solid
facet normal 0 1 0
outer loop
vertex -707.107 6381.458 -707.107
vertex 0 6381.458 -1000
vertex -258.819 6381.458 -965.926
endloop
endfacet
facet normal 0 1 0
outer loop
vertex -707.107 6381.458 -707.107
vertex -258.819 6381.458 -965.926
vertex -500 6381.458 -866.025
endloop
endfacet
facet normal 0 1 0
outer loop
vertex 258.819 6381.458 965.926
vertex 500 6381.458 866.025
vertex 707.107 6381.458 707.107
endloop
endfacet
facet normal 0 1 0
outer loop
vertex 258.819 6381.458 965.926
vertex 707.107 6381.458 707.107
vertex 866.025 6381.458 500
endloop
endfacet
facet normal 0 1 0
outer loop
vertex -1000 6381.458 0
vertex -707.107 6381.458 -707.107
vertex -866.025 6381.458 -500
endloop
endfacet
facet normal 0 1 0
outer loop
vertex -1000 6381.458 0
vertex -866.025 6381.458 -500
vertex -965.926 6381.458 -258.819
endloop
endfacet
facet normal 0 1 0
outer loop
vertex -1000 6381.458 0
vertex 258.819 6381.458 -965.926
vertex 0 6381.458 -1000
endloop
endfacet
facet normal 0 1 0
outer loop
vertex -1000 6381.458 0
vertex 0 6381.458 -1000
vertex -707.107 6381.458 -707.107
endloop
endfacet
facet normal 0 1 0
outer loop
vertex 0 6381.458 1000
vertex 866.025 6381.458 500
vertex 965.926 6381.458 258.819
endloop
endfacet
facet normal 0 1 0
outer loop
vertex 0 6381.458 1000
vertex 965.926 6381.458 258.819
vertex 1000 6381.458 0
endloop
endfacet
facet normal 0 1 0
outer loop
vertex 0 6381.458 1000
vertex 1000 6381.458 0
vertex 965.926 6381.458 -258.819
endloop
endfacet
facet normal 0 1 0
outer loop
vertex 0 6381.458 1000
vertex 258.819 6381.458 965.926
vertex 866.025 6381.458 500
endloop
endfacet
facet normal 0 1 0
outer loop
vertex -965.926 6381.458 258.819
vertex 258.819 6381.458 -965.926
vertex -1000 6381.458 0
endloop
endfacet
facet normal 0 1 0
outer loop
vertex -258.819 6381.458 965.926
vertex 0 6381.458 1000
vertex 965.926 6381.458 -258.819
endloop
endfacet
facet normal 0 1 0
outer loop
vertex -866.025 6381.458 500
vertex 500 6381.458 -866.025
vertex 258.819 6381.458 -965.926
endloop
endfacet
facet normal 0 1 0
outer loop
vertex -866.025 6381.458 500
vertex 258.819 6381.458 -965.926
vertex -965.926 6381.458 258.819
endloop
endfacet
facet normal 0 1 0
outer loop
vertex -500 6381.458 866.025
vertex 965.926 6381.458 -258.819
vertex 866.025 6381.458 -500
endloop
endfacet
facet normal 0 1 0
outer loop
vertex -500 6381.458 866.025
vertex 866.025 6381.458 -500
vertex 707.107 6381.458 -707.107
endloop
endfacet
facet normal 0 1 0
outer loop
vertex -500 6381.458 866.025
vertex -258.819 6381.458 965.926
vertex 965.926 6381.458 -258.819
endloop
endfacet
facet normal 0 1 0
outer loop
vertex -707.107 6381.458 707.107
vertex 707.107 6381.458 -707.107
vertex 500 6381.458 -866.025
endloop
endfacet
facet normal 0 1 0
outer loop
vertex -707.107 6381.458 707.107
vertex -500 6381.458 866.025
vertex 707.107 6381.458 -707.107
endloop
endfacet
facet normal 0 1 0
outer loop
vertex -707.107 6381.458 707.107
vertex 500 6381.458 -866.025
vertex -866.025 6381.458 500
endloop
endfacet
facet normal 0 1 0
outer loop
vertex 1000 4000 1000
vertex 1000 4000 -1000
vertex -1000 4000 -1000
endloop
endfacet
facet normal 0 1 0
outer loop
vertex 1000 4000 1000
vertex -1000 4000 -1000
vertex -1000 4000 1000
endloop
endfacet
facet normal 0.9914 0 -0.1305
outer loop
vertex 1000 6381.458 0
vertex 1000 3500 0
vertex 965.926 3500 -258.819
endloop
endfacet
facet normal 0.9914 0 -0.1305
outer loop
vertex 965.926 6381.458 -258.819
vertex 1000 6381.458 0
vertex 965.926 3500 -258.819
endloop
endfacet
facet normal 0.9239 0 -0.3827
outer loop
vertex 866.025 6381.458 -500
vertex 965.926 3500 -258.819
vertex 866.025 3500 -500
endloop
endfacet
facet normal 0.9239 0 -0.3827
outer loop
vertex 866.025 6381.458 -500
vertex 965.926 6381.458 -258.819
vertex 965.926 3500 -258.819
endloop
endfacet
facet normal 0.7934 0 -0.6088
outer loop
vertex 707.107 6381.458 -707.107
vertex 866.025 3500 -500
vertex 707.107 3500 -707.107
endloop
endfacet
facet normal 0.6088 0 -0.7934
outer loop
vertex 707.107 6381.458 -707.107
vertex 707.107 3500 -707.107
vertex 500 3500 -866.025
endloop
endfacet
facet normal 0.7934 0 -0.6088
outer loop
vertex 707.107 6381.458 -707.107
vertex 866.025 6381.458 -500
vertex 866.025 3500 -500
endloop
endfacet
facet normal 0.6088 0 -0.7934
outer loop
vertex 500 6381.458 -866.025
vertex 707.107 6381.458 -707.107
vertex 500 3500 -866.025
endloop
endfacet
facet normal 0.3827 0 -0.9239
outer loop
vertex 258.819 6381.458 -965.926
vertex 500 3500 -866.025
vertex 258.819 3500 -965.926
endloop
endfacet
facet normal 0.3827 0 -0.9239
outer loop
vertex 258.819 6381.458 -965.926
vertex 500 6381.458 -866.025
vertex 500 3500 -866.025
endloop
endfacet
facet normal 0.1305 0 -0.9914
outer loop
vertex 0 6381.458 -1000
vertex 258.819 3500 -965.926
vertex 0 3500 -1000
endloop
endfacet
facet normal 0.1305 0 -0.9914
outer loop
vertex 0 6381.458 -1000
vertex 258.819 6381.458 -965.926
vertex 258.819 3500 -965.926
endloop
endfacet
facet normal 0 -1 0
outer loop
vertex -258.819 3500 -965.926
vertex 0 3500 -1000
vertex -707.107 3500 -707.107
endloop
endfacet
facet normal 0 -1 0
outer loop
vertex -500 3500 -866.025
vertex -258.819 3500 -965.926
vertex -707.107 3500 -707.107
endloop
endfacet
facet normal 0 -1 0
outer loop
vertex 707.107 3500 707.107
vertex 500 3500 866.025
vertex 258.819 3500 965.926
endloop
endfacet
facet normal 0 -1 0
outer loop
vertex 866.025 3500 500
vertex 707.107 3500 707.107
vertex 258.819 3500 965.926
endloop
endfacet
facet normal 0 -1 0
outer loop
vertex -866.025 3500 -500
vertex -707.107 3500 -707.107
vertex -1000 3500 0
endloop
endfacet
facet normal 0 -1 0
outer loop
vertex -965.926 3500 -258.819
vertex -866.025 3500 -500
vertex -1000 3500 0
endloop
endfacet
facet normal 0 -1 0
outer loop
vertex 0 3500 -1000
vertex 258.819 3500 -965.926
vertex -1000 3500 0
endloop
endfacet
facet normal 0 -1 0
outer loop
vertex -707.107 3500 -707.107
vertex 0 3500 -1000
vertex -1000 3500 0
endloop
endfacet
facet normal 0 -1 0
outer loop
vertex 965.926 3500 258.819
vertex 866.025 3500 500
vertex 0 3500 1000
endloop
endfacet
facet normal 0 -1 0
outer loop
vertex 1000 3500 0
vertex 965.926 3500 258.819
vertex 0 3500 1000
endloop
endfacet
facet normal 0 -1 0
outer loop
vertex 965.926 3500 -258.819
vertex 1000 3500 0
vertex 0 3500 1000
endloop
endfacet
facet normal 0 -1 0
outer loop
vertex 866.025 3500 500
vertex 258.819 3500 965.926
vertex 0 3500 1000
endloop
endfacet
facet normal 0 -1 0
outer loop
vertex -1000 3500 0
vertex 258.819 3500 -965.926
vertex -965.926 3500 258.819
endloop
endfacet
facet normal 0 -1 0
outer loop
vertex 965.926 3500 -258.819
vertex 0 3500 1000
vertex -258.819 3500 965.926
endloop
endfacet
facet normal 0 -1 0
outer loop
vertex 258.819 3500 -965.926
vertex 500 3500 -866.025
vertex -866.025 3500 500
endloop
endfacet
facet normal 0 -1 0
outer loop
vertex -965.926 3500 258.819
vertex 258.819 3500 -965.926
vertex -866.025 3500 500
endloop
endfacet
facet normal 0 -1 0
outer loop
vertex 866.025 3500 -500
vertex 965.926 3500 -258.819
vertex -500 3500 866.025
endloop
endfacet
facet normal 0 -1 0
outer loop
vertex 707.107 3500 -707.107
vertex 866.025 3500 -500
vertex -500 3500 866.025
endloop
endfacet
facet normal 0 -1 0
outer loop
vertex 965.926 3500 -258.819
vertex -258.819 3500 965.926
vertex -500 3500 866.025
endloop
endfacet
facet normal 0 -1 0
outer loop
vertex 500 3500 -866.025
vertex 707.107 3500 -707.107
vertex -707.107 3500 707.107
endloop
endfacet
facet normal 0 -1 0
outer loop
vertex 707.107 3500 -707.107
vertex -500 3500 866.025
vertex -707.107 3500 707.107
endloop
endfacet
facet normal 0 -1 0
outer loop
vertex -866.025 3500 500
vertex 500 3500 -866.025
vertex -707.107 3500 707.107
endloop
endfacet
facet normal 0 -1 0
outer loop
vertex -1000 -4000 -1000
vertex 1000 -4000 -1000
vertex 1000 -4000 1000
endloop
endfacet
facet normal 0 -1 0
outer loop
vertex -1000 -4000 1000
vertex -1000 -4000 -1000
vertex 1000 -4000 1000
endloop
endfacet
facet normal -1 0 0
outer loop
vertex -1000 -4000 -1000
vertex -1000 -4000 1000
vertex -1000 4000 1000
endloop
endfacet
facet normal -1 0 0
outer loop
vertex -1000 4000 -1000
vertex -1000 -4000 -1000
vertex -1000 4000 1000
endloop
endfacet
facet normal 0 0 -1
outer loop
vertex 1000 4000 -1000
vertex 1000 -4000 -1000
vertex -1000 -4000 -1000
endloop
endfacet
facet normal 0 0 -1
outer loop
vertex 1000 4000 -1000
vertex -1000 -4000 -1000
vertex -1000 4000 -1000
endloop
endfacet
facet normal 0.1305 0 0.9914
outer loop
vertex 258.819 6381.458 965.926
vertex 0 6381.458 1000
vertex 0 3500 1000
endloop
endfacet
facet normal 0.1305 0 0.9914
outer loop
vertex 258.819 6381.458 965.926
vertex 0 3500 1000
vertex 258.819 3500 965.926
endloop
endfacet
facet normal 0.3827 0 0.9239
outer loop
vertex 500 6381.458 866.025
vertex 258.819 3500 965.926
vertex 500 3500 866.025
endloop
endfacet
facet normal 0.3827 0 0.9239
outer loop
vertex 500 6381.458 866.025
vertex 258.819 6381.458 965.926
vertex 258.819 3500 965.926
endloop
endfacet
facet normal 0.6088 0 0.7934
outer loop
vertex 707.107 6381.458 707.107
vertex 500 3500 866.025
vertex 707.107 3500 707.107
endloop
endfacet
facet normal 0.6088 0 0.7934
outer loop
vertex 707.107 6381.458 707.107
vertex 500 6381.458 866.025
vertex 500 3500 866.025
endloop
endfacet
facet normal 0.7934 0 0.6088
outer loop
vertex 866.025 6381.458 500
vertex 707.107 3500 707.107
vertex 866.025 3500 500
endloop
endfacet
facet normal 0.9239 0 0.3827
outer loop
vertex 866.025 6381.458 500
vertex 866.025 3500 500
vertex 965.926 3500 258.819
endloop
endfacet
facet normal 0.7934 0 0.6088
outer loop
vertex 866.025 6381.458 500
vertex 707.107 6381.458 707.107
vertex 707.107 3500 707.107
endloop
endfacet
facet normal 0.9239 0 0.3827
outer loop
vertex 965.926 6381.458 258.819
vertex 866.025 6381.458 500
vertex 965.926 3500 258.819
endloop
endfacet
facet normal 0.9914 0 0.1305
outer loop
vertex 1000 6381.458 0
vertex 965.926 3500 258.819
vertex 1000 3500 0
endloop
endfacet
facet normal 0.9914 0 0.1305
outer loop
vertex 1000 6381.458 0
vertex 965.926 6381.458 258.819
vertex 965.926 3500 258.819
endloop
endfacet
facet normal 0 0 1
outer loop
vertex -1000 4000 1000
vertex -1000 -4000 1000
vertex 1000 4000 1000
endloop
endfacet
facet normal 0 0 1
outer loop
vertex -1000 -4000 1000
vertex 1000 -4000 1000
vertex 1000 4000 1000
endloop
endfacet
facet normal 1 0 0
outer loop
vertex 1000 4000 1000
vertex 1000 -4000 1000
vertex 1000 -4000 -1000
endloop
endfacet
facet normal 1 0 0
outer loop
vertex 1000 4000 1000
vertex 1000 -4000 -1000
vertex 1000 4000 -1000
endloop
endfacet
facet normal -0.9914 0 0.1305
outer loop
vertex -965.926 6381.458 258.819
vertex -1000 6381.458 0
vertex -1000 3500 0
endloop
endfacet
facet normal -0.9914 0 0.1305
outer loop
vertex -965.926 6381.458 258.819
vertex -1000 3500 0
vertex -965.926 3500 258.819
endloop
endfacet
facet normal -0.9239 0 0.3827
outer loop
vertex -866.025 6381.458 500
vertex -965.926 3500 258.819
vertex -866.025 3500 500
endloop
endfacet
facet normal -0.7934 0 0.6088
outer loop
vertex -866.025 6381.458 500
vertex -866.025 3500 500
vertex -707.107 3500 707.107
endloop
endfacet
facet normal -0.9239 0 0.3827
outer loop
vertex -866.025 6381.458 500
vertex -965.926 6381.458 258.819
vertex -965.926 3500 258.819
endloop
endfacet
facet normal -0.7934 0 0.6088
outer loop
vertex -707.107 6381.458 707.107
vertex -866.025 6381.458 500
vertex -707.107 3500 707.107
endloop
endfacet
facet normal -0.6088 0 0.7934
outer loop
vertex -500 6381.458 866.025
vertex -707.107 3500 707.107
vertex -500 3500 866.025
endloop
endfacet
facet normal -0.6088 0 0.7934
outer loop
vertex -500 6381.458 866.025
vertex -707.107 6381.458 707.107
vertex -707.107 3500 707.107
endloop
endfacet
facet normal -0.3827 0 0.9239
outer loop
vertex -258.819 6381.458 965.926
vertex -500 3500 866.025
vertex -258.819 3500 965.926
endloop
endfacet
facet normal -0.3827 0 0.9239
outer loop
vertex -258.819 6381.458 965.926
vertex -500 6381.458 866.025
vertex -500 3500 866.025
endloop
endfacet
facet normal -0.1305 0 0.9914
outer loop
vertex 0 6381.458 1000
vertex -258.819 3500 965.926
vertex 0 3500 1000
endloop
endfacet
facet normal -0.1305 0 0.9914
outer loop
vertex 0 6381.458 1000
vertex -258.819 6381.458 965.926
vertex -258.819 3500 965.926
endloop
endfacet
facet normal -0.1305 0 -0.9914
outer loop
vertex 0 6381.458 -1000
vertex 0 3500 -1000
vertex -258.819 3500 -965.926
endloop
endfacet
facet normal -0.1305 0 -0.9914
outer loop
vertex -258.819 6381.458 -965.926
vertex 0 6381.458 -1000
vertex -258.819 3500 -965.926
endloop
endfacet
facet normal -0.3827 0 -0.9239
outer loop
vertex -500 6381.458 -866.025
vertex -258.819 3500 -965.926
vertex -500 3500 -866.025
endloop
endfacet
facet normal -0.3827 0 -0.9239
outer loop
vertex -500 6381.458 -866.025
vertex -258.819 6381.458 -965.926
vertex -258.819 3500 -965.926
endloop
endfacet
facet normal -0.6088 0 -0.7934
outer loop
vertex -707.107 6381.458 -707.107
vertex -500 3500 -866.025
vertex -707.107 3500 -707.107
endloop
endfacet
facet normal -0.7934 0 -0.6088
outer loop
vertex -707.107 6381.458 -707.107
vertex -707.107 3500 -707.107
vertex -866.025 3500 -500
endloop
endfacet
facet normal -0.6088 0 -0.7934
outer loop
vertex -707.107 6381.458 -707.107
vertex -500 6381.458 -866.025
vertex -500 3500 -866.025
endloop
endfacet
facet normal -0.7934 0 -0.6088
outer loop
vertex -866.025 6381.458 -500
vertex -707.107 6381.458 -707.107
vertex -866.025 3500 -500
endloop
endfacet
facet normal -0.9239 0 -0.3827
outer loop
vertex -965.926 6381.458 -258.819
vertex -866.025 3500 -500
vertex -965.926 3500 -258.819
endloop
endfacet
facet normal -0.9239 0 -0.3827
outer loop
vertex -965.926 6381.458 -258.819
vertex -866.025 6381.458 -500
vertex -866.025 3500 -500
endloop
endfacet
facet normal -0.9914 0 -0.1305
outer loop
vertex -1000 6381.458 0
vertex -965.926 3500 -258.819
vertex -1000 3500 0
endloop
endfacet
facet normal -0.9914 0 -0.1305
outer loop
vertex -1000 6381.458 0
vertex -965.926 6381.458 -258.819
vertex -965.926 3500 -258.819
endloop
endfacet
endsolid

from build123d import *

# Parameters (mm, degrees)
F0_W          = 8000
F0_H          = 2000
F1_DEPTH      = 1000
F3_DEPTH      = 2381.458
F3_DEPTH_BACK = 500


with BuildPart() as f1:
    # F0 (on Right) → F1 (new body, symmetric)
    with BuildSketch(Plane.YZ):
        Rectangle(F0_W, F0_H)
    extrude(amount=F1_DEPTH, both=True)


with BuildPart() as f3:
    # F2 (on face) → F3 (new body, two sides)
    with BuildSketch(Plane(origin=(0, 4000, 0), x_dir=(-1, 0, 0), z_dir=(0, 1, 0))) as f3_sk:
        with BuildLine():
            ThreePointArc((-1e-06, -1000), (707.106781, -707.106782), (1000, 0))
            ThreePointArc((1000, 0), (707.106782, 707.10678), (2e-06, 1000))
            ThreePointArc((2e-06, 1000), (-707.106782, 707.106781), (-1000, -3e-06))
            ThreePointArc((-1000, -3e-06), (-707.10678, -707.106782), (-1e-06, -1000))
        make_face()
    extrude(amount=F3_DEPTH)
    extrude(f3_sk.sketch, amount=-F3_DEPTH_BACK)


solid = Compound([f1.part, f3.part])
